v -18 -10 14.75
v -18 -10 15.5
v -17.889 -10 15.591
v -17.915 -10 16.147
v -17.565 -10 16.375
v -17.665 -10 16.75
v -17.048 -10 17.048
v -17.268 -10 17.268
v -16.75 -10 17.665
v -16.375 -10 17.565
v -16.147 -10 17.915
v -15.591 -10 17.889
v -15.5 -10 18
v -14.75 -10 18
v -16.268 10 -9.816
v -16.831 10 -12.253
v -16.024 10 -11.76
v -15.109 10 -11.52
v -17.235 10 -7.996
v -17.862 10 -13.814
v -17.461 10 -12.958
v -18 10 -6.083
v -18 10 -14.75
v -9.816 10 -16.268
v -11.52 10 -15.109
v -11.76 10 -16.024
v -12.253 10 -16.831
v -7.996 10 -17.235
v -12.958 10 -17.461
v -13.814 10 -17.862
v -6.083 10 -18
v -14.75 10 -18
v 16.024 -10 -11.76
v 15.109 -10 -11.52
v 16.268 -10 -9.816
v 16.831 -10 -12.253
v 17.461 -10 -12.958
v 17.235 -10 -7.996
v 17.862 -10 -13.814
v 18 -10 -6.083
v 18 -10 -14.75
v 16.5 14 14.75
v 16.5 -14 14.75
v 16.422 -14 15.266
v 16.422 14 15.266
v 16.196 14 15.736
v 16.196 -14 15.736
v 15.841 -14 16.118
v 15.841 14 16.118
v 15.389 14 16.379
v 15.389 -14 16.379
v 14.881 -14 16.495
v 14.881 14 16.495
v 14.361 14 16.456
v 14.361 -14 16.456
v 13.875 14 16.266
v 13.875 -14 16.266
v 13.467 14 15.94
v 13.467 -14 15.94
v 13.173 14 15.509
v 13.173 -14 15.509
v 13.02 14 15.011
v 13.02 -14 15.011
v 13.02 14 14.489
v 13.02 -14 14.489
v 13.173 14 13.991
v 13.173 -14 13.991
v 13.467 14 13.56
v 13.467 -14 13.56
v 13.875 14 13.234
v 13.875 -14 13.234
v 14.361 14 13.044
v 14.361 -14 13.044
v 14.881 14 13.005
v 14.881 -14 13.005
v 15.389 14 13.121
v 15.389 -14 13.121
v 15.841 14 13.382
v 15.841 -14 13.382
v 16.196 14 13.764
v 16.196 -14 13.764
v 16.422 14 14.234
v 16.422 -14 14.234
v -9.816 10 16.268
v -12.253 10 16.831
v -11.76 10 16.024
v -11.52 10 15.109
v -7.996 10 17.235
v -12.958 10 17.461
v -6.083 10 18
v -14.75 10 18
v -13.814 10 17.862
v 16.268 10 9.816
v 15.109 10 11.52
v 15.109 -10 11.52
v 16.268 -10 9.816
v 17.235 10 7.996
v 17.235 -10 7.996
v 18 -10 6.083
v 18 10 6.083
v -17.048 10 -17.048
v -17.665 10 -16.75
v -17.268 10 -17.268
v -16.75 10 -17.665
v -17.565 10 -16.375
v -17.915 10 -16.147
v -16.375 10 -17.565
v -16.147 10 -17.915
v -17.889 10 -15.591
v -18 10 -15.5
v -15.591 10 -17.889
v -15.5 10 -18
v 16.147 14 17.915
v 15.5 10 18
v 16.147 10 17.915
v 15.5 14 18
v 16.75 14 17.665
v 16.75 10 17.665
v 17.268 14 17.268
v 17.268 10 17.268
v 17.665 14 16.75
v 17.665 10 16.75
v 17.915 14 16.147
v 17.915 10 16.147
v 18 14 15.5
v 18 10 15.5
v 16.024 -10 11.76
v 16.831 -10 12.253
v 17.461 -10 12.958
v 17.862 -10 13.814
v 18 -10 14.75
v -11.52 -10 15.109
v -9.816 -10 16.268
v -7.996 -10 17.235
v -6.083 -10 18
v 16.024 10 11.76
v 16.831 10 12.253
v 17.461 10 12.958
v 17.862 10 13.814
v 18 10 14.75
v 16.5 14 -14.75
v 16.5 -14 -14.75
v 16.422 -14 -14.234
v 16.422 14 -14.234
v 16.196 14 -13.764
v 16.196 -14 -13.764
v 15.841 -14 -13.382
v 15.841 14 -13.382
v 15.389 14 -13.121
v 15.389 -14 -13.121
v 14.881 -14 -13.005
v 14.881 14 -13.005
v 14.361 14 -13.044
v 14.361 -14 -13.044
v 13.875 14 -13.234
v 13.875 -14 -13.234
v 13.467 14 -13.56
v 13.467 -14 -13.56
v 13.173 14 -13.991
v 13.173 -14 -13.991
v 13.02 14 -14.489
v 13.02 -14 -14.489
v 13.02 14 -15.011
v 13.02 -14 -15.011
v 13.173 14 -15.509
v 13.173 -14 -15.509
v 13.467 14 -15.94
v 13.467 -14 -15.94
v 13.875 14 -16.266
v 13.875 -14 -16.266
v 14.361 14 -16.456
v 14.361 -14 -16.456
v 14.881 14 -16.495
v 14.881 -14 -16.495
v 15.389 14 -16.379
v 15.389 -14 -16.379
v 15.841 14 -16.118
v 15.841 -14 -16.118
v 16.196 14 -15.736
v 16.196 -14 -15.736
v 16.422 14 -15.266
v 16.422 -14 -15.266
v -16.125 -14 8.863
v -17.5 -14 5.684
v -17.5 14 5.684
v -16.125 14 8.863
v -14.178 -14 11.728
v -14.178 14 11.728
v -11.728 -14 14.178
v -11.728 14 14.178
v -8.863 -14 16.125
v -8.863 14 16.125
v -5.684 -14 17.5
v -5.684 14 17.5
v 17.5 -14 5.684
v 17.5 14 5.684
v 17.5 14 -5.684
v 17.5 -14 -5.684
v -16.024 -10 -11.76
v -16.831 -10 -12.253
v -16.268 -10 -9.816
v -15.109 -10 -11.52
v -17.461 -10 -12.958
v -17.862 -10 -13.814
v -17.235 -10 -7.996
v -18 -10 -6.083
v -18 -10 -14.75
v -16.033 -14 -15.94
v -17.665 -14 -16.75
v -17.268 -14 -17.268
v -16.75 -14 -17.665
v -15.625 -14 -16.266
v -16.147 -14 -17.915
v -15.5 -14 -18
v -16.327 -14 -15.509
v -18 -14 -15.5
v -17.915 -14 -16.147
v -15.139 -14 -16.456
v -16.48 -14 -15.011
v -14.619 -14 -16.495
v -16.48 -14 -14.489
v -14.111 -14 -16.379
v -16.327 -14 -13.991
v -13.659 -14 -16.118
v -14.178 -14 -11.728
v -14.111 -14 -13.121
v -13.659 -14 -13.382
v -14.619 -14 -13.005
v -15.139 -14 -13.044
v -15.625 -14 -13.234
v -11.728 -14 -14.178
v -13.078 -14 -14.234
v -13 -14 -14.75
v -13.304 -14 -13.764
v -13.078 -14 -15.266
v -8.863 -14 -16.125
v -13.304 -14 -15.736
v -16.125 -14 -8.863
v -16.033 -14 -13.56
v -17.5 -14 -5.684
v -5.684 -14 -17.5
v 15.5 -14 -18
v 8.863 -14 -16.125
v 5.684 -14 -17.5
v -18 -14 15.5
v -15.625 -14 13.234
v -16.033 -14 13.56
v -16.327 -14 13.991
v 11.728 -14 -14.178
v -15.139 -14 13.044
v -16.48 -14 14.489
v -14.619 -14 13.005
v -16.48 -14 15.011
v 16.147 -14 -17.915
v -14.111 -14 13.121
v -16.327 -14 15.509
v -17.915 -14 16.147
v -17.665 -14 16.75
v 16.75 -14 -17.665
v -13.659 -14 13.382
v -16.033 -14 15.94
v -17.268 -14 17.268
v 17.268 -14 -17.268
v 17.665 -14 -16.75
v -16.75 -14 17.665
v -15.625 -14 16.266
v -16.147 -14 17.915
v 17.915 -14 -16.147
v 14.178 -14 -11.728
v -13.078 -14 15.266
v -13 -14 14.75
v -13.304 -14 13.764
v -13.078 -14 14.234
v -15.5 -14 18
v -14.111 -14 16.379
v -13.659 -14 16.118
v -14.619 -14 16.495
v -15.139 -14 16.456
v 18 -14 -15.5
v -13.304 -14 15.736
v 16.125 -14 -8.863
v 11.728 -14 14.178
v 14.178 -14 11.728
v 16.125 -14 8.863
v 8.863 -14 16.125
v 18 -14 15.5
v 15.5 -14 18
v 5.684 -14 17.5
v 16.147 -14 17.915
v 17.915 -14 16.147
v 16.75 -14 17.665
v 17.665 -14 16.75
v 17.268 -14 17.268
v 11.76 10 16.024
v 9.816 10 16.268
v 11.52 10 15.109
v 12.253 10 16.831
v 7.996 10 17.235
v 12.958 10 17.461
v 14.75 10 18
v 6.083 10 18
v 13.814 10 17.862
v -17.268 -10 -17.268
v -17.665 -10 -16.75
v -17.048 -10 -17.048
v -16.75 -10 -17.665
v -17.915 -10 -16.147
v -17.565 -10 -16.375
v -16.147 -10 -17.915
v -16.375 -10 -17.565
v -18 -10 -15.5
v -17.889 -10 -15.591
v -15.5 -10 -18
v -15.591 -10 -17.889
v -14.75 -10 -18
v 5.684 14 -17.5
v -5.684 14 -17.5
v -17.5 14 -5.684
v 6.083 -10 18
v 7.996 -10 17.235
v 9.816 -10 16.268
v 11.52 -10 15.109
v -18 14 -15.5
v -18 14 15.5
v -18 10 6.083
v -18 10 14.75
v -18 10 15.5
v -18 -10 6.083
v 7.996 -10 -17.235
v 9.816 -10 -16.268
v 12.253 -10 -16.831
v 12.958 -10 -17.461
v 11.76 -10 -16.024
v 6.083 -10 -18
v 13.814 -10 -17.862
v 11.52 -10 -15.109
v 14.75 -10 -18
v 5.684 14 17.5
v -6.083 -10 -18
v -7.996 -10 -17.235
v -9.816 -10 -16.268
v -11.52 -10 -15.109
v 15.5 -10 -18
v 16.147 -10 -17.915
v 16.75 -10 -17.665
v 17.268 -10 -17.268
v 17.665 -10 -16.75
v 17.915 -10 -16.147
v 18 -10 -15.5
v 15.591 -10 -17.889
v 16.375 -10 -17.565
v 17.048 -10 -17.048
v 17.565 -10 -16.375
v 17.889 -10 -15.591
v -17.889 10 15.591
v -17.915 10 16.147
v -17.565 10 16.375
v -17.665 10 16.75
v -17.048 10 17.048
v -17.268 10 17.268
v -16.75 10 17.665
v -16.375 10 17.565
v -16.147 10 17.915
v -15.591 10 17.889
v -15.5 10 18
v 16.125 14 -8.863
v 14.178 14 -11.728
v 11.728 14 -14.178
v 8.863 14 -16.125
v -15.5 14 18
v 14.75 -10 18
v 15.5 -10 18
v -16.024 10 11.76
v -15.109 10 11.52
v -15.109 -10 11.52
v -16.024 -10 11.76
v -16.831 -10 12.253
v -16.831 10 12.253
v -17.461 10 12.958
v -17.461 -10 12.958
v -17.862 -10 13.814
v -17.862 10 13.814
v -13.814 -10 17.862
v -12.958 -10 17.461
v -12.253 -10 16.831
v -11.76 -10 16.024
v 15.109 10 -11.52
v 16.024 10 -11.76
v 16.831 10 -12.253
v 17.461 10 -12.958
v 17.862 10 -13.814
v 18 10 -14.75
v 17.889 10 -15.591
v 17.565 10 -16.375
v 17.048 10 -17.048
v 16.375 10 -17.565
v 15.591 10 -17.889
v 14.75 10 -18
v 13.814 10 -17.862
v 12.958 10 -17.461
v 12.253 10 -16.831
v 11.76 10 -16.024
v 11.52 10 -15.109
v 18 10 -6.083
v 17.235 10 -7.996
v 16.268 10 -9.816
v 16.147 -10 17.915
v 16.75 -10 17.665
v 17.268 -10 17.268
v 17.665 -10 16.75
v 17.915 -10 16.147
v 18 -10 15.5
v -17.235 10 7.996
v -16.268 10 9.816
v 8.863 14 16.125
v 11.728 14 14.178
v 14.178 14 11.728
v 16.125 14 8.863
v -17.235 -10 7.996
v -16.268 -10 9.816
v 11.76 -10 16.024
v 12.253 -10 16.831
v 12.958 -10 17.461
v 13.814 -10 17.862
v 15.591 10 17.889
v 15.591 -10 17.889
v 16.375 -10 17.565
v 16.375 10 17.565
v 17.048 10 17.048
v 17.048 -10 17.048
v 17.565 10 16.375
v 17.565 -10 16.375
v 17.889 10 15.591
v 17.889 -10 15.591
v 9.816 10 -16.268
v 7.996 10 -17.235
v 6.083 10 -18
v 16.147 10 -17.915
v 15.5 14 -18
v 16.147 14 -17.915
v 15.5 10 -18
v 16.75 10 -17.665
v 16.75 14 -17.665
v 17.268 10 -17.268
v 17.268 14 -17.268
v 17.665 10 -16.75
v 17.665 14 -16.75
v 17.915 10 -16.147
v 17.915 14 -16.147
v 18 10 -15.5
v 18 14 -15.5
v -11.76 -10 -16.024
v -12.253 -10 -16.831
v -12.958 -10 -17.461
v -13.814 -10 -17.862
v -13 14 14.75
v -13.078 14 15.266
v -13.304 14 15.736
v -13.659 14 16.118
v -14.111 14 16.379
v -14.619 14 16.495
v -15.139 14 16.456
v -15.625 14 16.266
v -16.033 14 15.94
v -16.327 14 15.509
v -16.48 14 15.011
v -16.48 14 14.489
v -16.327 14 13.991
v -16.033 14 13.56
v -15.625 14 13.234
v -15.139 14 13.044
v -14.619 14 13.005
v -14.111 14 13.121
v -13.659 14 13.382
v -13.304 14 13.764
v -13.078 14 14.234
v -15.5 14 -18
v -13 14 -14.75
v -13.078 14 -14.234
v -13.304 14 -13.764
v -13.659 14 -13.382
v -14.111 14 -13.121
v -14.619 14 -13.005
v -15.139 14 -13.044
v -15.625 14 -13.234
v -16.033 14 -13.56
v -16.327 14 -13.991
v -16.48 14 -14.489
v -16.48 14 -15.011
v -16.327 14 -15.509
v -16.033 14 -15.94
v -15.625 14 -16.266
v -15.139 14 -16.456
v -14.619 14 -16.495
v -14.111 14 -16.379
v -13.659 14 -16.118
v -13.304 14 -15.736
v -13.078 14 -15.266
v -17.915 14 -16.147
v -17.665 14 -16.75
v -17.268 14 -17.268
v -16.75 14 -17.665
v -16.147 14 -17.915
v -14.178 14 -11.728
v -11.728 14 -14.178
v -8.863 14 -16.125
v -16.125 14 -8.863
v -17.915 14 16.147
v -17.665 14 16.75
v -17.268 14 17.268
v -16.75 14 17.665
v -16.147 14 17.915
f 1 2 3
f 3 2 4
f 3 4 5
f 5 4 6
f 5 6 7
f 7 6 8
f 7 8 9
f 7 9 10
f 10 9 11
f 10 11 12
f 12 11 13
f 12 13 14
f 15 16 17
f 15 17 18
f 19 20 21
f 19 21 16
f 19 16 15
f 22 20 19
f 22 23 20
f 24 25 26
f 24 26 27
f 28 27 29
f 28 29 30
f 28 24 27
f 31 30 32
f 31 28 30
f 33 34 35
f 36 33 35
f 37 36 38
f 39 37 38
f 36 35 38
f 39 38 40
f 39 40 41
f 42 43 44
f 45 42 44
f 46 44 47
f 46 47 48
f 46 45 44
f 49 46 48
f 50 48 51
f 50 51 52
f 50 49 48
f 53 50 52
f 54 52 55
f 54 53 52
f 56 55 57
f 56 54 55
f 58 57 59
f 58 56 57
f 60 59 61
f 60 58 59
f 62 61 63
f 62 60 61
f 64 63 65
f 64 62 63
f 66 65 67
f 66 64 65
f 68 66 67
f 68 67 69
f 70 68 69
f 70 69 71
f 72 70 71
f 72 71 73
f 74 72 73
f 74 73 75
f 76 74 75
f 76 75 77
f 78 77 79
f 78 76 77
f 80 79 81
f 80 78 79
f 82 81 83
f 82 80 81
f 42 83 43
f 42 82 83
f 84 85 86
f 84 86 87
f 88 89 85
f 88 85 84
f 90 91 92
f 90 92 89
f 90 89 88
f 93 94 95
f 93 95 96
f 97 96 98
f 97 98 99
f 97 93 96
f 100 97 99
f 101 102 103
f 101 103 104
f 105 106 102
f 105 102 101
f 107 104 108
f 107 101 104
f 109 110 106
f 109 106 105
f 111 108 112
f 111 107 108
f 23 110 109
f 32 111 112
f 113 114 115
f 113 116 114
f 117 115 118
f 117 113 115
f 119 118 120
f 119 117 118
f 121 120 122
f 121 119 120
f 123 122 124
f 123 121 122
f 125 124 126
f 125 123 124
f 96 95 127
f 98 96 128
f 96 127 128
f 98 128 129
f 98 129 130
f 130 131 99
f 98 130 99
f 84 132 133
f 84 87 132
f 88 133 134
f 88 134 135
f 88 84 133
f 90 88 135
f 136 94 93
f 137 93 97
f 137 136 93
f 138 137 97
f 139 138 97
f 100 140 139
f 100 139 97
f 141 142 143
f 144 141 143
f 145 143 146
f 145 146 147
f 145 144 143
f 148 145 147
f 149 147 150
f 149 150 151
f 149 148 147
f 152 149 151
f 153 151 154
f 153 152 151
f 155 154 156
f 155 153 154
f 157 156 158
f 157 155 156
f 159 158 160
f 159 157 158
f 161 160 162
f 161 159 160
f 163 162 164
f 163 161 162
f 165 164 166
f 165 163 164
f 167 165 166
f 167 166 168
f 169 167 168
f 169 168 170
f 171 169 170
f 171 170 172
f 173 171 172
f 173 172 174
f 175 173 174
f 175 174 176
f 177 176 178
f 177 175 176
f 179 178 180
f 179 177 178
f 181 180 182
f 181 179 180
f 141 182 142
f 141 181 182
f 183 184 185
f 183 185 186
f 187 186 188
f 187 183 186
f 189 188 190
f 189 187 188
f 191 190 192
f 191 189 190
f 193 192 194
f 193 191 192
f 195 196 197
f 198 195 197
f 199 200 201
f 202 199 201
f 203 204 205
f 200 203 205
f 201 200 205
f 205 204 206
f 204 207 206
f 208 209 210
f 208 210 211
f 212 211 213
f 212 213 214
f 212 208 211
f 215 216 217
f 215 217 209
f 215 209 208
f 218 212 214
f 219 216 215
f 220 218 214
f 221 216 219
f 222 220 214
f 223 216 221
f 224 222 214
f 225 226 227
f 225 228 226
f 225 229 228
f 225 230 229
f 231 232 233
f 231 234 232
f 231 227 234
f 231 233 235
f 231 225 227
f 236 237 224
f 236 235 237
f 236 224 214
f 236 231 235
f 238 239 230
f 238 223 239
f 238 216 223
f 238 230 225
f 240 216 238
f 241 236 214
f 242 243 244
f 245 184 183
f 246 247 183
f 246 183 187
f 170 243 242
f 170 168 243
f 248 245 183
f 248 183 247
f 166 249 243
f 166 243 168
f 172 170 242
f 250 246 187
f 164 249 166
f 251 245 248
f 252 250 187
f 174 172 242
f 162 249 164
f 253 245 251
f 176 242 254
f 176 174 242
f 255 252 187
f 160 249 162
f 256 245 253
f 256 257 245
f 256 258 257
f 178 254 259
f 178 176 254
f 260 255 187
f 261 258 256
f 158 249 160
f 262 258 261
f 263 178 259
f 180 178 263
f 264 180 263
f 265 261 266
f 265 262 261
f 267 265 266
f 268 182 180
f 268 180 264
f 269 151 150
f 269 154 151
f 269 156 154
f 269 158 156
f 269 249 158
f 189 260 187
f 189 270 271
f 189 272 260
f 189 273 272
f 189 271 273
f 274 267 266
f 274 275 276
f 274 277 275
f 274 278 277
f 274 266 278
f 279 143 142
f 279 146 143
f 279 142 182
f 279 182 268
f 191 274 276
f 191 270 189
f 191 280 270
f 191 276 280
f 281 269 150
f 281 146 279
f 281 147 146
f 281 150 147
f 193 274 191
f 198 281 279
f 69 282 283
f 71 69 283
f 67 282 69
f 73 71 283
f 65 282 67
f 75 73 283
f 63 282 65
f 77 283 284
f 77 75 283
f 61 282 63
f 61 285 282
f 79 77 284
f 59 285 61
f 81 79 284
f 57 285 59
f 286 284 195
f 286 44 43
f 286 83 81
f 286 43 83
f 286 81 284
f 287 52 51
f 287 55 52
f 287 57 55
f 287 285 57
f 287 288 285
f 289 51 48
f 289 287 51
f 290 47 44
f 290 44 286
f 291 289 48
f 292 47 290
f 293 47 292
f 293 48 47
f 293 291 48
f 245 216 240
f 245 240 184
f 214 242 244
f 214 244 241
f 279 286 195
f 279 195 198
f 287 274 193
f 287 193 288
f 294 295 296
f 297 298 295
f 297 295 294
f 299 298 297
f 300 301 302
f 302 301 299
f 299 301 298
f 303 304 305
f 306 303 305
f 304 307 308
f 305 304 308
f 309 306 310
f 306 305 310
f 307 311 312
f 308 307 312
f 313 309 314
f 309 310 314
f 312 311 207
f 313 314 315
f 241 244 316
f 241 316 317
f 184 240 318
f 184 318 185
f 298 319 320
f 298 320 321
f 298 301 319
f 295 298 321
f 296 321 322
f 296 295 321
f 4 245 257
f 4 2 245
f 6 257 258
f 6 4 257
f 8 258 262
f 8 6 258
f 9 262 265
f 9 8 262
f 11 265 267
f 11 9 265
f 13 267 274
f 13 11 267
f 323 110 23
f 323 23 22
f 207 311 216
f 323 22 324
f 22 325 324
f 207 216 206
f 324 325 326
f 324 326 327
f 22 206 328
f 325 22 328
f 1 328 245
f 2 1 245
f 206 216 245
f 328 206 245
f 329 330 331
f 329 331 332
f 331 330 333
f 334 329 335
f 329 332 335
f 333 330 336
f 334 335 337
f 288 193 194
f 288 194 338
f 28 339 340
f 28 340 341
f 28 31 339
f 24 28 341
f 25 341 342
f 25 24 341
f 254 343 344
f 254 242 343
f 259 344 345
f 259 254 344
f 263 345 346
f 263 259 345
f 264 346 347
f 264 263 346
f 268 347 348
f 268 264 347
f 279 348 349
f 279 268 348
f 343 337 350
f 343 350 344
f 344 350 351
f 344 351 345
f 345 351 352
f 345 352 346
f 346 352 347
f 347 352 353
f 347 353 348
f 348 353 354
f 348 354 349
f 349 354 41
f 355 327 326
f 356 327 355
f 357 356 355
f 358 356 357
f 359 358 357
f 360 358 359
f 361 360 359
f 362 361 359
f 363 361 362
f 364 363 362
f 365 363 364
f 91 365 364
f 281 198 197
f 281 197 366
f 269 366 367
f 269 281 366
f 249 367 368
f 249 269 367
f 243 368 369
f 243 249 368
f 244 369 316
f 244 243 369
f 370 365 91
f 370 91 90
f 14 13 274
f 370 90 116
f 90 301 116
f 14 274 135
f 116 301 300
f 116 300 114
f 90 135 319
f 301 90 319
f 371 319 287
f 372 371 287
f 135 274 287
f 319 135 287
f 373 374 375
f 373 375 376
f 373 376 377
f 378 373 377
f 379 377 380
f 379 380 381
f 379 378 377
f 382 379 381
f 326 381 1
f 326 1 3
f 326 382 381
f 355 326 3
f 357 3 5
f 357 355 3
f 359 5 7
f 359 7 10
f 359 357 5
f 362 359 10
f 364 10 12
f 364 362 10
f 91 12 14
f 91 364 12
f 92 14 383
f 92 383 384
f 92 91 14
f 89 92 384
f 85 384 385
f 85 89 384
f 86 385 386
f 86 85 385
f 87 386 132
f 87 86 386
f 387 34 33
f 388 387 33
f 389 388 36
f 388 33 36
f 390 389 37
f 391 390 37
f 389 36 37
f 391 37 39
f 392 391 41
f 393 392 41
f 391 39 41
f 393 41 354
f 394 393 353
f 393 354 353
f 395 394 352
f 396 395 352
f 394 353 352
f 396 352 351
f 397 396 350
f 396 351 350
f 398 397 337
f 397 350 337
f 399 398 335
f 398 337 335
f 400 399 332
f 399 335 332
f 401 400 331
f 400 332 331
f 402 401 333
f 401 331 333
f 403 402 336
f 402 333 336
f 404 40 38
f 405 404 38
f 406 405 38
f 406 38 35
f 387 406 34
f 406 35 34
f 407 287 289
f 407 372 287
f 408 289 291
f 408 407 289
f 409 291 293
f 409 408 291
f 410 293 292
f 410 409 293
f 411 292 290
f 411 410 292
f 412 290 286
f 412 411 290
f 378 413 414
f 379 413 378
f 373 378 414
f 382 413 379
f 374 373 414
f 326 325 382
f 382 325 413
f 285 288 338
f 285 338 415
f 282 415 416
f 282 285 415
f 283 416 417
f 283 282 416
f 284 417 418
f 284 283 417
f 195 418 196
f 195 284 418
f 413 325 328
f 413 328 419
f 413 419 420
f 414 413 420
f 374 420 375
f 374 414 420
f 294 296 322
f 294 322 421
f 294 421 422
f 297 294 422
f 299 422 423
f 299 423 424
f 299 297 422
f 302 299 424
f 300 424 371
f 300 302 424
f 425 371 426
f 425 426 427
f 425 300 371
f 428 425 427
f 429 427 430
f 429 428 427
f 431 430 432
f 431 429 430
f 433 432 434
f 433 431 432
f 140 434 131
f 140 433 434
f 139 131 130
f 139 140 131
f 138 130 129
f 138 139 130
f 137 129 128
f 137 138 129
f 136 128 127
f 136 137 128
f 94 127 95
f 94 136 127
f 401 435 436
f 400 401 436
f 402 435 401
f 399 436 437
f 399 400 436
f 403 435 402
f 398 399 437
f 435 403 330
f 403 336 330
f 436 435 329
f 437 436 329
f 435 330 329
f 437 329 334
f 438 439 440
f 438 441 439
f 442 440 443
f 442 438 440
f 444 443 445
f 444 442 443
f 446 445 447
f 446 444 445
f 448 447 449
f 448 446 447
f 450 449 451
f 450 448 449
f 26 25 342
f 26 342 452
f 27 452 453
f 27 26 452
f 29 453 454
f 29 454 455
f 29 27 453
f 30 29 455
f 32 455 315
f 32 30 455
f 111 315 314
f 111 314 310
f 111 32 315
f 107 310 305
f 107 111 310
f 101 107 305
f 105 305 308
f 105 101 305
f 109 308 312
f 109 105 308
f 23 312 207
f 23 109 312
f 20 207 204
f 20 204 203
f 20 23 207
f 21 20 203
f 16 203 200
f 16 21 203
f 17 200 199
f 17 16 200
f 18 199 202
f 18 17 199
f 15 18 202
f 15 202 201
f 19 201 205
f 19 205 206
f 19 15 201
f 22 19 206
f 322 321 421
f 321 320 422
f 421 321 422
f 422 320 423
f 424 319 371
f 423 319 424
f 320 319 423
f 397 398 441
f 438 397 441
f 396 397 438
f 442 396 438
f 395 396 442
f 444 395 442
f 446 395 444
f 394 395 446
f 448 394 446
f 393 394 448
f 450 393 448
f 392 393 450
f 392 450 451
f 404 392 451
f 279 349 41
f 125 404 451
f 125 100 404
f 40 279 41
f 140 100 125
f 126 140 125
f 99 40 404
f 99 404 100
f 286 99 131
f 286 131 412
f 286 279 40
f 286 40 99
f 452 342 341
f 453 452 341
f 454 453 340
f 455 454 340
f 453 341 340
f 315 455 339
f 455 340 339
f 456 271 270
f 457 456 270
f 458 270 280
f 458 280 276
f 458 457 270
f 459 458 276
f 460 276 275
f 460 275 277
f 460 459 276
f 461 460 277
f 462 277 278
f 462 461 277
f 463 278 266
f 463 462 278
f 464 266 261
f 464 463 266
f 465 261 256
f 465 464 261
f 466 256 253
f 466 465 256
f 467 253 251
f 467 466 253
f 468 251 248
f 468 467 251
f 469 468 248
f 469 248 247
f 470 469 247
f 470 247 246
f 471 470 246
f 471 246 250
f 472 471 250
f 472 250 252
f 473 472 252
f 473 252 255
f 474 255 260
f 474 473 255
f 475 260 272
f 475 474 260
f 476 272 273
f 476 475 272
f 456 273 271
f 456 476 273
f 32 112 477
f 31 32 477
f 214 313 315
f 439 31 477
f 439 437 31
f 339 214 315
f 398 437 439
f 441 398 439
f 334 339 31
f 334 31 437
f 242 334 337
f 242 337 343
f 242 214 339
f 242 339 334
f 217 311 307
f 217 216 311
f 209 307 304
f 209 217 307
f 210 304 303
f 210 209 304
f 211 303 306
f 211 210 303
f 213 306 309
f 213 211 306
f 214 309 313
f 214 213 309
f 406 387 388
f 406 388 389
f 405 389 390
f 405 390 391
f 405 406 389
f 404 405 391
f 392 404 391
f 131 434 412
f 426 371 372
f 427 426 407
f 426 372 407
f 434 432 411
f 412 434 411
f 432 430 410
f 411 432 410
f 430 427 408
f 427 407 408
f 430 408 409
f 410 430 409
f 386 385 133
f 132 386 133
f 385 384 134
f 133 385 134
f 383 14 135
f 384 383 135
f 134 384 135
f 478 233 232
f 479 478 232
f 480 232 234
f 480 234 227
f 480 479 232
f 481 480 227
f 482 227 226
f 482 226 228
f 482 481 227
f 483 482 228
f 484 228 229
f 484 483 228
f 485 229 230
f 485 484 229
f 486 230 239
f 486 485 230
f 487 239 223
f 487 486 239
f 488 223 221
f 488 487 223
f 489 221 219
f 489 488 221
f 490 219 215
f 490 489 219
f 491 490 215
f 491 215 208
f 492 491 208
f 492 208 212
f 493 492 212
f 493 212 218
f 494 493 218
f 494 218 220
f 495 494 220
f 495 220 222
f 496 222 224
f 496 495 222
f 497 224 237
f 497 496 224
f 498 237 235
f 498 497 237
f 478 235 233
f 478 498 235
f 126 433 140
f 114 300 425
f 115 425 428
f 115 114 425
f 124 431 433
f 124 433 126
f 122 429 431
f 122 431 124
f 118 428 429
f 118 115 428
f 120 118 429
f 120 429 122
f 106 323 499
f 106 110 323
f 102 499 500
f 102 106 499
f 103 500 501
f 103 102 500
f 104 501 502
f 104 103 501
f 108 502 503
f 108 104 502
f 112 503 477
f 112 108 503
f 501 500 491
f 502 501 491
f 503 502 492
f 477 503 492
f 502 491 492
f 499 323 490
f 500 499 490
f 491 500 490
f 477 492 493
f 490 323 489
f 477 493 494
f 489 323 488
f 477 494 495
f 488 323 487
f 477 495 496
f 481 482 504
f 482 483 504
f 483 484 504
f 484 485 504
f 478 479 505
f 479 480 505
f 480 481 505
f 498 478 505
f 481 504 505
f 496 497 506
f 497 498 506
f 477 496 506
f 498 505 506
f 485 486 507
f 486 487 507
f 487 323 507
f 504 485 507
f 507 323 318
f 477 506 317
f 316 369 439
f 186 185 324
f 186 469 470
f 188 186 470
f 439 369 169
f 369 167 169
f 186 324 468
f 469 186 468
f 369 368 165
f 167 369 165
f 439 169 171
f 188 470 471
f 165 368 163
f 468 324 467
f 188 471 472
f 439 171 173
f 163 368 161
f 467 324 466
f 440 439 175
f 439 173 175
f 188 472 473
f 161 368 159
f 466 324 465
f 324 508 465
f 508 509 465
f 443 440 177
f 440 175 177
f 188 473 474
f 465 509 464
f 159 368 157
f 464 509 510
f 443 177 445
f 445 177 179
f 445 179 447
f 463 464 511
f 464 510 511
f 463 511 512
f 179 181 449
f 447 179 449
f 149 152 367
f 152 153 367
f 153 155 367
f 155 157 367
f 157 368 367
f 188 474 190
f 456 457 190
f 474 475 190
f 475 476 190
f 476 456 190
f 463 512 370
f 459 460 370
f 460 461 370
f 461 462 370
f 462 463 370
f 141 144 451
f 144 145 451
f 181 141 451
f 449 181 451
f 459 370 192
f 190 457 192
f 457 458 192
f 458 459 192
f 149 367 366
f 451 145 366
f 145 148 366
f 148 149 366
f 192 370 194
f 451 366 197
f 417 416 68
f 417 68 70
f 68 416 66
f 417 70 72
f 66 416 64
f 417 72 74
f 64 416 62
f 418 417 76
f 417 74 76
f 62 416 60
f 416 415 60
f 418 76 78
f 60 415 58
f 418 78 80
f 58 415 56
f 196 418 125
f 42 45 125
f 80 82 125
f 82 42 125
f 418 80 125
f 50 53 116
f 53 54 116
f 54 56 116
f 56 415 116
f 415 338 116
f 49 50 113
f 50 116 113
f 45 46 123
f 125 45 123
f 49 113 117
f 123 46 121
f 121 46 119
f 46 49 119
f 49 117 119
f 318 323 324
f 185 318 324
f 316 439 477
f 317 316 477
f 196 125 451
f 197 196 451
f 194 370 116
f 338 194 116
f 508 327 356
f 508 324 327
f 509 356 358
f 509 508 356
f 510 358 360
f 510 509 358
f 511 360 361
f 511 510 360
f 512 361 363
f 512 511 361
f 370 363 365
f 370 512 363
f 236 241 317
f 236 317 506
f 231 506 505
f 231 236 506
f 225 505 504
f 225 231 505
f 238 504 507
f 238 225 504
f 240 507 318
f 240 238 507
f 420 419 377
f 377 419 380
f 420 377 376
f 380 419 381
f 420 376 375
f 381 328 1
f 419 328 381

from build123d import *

# Parameters (mm, degrees)
F0_W     = 36
F0_H     = 36
F0_R     = 1.75
F1_DEPTH = 14
F3_DEPTH = 10
F4_R     = 2.5


with BuildPart() as f1:
    # F0 (on Front) → F1 (new body, symmetric)
    with BuildSketch(Plane.XZ):
        Rectangle(F0_W, F0_H)
        with Locations((-14.75, -14.75)):
            Circle(F0_R, mode=Mode.SUBTRACT)
        with Locations((14.75, -14.75)):
            Circle(F0_R, mode=Mode.SUBTRACT)
        with Locations((-14.75, 14.75)):
            Circle(F0_R, mode=Mode.SUBTRACT)
        with BuildLine():
            ThreePointArc((-17.5, 5.6841885964), (-13.0107647738, 13.0107647738), (-5.6841885964, 17.5))
            Line((-5.6841885964, 17.5), (5.6841885964, 17.5))
            ThreePointArc((5.6841885964, 17.5), (13.0107647738, 13.0107647738), (17.5, 5.6841885964))
            Line((17.5, 5.6841885964), (17.5, -5.6841885964))
            ThreePointArc((17.5, -5.6841885964), (13.0107647738, -13.0107647738), (5.6841885964, -17.5))
            Line((5.6841885964, -17.5), (-5.6841885964, -17.5))
            ThreePointArc((-5.6841885964, -17.5), (-13.0107647738, -13.0107647738), (-17.5, -5.6841885964))
            Line((-17.5, -5.6841885964), (-17.5, 5.6841885964))
        make_face(mode=Mode.SUBTRACT)
        with Locations((14.75, 14.75)):
            Circle(F0_R, mode=Mode.SUBTRACT)
    extrude(amount=F1_DEPTH, both=True)

    # F2 (on Front) → F3 (cut, symmetric)
    with BuildSketch(Plane.XZ):
        with BuildLine():
            ThreePointArc((-15.1093137054, 11.5199235828), (-17.0480970389, 17.0480970389), (-11.5199235828, 15.1093137054))
            ThreePointArc((-11.5199235828, 15.1093137054), (-8.9192295863, 16.7763924485), (-6.0827625303, 18))
            Line((-6.0827625303, 18), (-6.0827625303, 19))
            Line((-6.0827625303, 19), (-19, 19))
            Line((-19, 19), (-19, 6.0827625303))
            Line((-19, 6.0827625303), (-18, 6.0827625303))
            ThreePointArc((-18, 6.0827625303), (-16.7763924485, 8.9192295863), (-15.1093137054, 11.5199235828))
        make_face()
        with BuildLine():
            Line((19, 6.0827625303), (19, 19))
            Line((19, 19), (6.0827625303, 19))
            Line((6.0827625303, 19), (6.0827625303, 18))
            ThreePointArc((6.0827625303, 18), (8.9192295863, 16.7763924485), (11.5199235828, 15.1093137054))
            ThreePointArc((11.5199235828, 15.1093137054), (17.0480970389, 17.0480970389), (15.1093137054, 11.5199235828))
            ThreePointArc((15.1093137054, 11.5199235828), (16.7763924485, 8.9192295863), (18, 6.0827625303))
            Line((18, 6.0827625303), (19, 6.0827625303))
        make_face()
        with BuildLine():
            Line((-19, -6.0827625303), (-19, -19))
            Line((-19, -19), (-6.0827625303, -19))
            Line((-6.0827625303, -19), (-6.0827625303, -18))
            ThreePointArc((-6.0827625303, -18), (-8.9192295863, -16.7763924485), (-11.5199235828, -15.1093137054))
            ThreePointArc((-11.5199235828, -15.1093137054), (-17.0480970389, -17.0480970389), (-15.1093137054, -11.5199235828))
            ThreePointArc((-15.1093137054, -11.5199235828), (-16.7763924485, -8.9192295863), (-18, -6.0827625303))
            Line((-18, -6.0827625303), (-19, -6.0827625303))
        make_face()
        with BuildLine():
            Line((6.0827625303, -19), (19, -19))
            Line((19, -19), (19, -6.0827625303))
            Line((19, -6.0827625303), (18, -6.0827625303))
            ThreePointArc((18, -6.0827625303), (16.7763924485, -8.9192295863), (15.1093137054, -11.5199235828))
            ThreePointArc((15.1093137054, -11.5199235828), (17.0480970389, -17.0480970389), (11.5199235828, -15.1093137054))
            ThreePointArc((11.5199235828, -15.1093137054), (8.9192295863, -16.7763924485), (6.0827625303, -18))
            Line((6.0827625303, -18), (6.0827625303, -19))
        make_face()
    extrude(amount=F3_DEPTH, both=True, mode=Mode.SUBTRACT)

    # F4
    f4_edges = [f1.edges().sort_by_distance(p)[0] for p in [
        (18, -12, 18),
        (18, 12, 18),
        (18, -12, -18),
        (18, 12, -18),
        (-18, -12, 18),
        (-18, 12, 18),
        (-18, 12, -18),
        (-18, -12, -18),
    ]]
    fillet(f4_edges, radius=F4_R)


solid = f1.part
